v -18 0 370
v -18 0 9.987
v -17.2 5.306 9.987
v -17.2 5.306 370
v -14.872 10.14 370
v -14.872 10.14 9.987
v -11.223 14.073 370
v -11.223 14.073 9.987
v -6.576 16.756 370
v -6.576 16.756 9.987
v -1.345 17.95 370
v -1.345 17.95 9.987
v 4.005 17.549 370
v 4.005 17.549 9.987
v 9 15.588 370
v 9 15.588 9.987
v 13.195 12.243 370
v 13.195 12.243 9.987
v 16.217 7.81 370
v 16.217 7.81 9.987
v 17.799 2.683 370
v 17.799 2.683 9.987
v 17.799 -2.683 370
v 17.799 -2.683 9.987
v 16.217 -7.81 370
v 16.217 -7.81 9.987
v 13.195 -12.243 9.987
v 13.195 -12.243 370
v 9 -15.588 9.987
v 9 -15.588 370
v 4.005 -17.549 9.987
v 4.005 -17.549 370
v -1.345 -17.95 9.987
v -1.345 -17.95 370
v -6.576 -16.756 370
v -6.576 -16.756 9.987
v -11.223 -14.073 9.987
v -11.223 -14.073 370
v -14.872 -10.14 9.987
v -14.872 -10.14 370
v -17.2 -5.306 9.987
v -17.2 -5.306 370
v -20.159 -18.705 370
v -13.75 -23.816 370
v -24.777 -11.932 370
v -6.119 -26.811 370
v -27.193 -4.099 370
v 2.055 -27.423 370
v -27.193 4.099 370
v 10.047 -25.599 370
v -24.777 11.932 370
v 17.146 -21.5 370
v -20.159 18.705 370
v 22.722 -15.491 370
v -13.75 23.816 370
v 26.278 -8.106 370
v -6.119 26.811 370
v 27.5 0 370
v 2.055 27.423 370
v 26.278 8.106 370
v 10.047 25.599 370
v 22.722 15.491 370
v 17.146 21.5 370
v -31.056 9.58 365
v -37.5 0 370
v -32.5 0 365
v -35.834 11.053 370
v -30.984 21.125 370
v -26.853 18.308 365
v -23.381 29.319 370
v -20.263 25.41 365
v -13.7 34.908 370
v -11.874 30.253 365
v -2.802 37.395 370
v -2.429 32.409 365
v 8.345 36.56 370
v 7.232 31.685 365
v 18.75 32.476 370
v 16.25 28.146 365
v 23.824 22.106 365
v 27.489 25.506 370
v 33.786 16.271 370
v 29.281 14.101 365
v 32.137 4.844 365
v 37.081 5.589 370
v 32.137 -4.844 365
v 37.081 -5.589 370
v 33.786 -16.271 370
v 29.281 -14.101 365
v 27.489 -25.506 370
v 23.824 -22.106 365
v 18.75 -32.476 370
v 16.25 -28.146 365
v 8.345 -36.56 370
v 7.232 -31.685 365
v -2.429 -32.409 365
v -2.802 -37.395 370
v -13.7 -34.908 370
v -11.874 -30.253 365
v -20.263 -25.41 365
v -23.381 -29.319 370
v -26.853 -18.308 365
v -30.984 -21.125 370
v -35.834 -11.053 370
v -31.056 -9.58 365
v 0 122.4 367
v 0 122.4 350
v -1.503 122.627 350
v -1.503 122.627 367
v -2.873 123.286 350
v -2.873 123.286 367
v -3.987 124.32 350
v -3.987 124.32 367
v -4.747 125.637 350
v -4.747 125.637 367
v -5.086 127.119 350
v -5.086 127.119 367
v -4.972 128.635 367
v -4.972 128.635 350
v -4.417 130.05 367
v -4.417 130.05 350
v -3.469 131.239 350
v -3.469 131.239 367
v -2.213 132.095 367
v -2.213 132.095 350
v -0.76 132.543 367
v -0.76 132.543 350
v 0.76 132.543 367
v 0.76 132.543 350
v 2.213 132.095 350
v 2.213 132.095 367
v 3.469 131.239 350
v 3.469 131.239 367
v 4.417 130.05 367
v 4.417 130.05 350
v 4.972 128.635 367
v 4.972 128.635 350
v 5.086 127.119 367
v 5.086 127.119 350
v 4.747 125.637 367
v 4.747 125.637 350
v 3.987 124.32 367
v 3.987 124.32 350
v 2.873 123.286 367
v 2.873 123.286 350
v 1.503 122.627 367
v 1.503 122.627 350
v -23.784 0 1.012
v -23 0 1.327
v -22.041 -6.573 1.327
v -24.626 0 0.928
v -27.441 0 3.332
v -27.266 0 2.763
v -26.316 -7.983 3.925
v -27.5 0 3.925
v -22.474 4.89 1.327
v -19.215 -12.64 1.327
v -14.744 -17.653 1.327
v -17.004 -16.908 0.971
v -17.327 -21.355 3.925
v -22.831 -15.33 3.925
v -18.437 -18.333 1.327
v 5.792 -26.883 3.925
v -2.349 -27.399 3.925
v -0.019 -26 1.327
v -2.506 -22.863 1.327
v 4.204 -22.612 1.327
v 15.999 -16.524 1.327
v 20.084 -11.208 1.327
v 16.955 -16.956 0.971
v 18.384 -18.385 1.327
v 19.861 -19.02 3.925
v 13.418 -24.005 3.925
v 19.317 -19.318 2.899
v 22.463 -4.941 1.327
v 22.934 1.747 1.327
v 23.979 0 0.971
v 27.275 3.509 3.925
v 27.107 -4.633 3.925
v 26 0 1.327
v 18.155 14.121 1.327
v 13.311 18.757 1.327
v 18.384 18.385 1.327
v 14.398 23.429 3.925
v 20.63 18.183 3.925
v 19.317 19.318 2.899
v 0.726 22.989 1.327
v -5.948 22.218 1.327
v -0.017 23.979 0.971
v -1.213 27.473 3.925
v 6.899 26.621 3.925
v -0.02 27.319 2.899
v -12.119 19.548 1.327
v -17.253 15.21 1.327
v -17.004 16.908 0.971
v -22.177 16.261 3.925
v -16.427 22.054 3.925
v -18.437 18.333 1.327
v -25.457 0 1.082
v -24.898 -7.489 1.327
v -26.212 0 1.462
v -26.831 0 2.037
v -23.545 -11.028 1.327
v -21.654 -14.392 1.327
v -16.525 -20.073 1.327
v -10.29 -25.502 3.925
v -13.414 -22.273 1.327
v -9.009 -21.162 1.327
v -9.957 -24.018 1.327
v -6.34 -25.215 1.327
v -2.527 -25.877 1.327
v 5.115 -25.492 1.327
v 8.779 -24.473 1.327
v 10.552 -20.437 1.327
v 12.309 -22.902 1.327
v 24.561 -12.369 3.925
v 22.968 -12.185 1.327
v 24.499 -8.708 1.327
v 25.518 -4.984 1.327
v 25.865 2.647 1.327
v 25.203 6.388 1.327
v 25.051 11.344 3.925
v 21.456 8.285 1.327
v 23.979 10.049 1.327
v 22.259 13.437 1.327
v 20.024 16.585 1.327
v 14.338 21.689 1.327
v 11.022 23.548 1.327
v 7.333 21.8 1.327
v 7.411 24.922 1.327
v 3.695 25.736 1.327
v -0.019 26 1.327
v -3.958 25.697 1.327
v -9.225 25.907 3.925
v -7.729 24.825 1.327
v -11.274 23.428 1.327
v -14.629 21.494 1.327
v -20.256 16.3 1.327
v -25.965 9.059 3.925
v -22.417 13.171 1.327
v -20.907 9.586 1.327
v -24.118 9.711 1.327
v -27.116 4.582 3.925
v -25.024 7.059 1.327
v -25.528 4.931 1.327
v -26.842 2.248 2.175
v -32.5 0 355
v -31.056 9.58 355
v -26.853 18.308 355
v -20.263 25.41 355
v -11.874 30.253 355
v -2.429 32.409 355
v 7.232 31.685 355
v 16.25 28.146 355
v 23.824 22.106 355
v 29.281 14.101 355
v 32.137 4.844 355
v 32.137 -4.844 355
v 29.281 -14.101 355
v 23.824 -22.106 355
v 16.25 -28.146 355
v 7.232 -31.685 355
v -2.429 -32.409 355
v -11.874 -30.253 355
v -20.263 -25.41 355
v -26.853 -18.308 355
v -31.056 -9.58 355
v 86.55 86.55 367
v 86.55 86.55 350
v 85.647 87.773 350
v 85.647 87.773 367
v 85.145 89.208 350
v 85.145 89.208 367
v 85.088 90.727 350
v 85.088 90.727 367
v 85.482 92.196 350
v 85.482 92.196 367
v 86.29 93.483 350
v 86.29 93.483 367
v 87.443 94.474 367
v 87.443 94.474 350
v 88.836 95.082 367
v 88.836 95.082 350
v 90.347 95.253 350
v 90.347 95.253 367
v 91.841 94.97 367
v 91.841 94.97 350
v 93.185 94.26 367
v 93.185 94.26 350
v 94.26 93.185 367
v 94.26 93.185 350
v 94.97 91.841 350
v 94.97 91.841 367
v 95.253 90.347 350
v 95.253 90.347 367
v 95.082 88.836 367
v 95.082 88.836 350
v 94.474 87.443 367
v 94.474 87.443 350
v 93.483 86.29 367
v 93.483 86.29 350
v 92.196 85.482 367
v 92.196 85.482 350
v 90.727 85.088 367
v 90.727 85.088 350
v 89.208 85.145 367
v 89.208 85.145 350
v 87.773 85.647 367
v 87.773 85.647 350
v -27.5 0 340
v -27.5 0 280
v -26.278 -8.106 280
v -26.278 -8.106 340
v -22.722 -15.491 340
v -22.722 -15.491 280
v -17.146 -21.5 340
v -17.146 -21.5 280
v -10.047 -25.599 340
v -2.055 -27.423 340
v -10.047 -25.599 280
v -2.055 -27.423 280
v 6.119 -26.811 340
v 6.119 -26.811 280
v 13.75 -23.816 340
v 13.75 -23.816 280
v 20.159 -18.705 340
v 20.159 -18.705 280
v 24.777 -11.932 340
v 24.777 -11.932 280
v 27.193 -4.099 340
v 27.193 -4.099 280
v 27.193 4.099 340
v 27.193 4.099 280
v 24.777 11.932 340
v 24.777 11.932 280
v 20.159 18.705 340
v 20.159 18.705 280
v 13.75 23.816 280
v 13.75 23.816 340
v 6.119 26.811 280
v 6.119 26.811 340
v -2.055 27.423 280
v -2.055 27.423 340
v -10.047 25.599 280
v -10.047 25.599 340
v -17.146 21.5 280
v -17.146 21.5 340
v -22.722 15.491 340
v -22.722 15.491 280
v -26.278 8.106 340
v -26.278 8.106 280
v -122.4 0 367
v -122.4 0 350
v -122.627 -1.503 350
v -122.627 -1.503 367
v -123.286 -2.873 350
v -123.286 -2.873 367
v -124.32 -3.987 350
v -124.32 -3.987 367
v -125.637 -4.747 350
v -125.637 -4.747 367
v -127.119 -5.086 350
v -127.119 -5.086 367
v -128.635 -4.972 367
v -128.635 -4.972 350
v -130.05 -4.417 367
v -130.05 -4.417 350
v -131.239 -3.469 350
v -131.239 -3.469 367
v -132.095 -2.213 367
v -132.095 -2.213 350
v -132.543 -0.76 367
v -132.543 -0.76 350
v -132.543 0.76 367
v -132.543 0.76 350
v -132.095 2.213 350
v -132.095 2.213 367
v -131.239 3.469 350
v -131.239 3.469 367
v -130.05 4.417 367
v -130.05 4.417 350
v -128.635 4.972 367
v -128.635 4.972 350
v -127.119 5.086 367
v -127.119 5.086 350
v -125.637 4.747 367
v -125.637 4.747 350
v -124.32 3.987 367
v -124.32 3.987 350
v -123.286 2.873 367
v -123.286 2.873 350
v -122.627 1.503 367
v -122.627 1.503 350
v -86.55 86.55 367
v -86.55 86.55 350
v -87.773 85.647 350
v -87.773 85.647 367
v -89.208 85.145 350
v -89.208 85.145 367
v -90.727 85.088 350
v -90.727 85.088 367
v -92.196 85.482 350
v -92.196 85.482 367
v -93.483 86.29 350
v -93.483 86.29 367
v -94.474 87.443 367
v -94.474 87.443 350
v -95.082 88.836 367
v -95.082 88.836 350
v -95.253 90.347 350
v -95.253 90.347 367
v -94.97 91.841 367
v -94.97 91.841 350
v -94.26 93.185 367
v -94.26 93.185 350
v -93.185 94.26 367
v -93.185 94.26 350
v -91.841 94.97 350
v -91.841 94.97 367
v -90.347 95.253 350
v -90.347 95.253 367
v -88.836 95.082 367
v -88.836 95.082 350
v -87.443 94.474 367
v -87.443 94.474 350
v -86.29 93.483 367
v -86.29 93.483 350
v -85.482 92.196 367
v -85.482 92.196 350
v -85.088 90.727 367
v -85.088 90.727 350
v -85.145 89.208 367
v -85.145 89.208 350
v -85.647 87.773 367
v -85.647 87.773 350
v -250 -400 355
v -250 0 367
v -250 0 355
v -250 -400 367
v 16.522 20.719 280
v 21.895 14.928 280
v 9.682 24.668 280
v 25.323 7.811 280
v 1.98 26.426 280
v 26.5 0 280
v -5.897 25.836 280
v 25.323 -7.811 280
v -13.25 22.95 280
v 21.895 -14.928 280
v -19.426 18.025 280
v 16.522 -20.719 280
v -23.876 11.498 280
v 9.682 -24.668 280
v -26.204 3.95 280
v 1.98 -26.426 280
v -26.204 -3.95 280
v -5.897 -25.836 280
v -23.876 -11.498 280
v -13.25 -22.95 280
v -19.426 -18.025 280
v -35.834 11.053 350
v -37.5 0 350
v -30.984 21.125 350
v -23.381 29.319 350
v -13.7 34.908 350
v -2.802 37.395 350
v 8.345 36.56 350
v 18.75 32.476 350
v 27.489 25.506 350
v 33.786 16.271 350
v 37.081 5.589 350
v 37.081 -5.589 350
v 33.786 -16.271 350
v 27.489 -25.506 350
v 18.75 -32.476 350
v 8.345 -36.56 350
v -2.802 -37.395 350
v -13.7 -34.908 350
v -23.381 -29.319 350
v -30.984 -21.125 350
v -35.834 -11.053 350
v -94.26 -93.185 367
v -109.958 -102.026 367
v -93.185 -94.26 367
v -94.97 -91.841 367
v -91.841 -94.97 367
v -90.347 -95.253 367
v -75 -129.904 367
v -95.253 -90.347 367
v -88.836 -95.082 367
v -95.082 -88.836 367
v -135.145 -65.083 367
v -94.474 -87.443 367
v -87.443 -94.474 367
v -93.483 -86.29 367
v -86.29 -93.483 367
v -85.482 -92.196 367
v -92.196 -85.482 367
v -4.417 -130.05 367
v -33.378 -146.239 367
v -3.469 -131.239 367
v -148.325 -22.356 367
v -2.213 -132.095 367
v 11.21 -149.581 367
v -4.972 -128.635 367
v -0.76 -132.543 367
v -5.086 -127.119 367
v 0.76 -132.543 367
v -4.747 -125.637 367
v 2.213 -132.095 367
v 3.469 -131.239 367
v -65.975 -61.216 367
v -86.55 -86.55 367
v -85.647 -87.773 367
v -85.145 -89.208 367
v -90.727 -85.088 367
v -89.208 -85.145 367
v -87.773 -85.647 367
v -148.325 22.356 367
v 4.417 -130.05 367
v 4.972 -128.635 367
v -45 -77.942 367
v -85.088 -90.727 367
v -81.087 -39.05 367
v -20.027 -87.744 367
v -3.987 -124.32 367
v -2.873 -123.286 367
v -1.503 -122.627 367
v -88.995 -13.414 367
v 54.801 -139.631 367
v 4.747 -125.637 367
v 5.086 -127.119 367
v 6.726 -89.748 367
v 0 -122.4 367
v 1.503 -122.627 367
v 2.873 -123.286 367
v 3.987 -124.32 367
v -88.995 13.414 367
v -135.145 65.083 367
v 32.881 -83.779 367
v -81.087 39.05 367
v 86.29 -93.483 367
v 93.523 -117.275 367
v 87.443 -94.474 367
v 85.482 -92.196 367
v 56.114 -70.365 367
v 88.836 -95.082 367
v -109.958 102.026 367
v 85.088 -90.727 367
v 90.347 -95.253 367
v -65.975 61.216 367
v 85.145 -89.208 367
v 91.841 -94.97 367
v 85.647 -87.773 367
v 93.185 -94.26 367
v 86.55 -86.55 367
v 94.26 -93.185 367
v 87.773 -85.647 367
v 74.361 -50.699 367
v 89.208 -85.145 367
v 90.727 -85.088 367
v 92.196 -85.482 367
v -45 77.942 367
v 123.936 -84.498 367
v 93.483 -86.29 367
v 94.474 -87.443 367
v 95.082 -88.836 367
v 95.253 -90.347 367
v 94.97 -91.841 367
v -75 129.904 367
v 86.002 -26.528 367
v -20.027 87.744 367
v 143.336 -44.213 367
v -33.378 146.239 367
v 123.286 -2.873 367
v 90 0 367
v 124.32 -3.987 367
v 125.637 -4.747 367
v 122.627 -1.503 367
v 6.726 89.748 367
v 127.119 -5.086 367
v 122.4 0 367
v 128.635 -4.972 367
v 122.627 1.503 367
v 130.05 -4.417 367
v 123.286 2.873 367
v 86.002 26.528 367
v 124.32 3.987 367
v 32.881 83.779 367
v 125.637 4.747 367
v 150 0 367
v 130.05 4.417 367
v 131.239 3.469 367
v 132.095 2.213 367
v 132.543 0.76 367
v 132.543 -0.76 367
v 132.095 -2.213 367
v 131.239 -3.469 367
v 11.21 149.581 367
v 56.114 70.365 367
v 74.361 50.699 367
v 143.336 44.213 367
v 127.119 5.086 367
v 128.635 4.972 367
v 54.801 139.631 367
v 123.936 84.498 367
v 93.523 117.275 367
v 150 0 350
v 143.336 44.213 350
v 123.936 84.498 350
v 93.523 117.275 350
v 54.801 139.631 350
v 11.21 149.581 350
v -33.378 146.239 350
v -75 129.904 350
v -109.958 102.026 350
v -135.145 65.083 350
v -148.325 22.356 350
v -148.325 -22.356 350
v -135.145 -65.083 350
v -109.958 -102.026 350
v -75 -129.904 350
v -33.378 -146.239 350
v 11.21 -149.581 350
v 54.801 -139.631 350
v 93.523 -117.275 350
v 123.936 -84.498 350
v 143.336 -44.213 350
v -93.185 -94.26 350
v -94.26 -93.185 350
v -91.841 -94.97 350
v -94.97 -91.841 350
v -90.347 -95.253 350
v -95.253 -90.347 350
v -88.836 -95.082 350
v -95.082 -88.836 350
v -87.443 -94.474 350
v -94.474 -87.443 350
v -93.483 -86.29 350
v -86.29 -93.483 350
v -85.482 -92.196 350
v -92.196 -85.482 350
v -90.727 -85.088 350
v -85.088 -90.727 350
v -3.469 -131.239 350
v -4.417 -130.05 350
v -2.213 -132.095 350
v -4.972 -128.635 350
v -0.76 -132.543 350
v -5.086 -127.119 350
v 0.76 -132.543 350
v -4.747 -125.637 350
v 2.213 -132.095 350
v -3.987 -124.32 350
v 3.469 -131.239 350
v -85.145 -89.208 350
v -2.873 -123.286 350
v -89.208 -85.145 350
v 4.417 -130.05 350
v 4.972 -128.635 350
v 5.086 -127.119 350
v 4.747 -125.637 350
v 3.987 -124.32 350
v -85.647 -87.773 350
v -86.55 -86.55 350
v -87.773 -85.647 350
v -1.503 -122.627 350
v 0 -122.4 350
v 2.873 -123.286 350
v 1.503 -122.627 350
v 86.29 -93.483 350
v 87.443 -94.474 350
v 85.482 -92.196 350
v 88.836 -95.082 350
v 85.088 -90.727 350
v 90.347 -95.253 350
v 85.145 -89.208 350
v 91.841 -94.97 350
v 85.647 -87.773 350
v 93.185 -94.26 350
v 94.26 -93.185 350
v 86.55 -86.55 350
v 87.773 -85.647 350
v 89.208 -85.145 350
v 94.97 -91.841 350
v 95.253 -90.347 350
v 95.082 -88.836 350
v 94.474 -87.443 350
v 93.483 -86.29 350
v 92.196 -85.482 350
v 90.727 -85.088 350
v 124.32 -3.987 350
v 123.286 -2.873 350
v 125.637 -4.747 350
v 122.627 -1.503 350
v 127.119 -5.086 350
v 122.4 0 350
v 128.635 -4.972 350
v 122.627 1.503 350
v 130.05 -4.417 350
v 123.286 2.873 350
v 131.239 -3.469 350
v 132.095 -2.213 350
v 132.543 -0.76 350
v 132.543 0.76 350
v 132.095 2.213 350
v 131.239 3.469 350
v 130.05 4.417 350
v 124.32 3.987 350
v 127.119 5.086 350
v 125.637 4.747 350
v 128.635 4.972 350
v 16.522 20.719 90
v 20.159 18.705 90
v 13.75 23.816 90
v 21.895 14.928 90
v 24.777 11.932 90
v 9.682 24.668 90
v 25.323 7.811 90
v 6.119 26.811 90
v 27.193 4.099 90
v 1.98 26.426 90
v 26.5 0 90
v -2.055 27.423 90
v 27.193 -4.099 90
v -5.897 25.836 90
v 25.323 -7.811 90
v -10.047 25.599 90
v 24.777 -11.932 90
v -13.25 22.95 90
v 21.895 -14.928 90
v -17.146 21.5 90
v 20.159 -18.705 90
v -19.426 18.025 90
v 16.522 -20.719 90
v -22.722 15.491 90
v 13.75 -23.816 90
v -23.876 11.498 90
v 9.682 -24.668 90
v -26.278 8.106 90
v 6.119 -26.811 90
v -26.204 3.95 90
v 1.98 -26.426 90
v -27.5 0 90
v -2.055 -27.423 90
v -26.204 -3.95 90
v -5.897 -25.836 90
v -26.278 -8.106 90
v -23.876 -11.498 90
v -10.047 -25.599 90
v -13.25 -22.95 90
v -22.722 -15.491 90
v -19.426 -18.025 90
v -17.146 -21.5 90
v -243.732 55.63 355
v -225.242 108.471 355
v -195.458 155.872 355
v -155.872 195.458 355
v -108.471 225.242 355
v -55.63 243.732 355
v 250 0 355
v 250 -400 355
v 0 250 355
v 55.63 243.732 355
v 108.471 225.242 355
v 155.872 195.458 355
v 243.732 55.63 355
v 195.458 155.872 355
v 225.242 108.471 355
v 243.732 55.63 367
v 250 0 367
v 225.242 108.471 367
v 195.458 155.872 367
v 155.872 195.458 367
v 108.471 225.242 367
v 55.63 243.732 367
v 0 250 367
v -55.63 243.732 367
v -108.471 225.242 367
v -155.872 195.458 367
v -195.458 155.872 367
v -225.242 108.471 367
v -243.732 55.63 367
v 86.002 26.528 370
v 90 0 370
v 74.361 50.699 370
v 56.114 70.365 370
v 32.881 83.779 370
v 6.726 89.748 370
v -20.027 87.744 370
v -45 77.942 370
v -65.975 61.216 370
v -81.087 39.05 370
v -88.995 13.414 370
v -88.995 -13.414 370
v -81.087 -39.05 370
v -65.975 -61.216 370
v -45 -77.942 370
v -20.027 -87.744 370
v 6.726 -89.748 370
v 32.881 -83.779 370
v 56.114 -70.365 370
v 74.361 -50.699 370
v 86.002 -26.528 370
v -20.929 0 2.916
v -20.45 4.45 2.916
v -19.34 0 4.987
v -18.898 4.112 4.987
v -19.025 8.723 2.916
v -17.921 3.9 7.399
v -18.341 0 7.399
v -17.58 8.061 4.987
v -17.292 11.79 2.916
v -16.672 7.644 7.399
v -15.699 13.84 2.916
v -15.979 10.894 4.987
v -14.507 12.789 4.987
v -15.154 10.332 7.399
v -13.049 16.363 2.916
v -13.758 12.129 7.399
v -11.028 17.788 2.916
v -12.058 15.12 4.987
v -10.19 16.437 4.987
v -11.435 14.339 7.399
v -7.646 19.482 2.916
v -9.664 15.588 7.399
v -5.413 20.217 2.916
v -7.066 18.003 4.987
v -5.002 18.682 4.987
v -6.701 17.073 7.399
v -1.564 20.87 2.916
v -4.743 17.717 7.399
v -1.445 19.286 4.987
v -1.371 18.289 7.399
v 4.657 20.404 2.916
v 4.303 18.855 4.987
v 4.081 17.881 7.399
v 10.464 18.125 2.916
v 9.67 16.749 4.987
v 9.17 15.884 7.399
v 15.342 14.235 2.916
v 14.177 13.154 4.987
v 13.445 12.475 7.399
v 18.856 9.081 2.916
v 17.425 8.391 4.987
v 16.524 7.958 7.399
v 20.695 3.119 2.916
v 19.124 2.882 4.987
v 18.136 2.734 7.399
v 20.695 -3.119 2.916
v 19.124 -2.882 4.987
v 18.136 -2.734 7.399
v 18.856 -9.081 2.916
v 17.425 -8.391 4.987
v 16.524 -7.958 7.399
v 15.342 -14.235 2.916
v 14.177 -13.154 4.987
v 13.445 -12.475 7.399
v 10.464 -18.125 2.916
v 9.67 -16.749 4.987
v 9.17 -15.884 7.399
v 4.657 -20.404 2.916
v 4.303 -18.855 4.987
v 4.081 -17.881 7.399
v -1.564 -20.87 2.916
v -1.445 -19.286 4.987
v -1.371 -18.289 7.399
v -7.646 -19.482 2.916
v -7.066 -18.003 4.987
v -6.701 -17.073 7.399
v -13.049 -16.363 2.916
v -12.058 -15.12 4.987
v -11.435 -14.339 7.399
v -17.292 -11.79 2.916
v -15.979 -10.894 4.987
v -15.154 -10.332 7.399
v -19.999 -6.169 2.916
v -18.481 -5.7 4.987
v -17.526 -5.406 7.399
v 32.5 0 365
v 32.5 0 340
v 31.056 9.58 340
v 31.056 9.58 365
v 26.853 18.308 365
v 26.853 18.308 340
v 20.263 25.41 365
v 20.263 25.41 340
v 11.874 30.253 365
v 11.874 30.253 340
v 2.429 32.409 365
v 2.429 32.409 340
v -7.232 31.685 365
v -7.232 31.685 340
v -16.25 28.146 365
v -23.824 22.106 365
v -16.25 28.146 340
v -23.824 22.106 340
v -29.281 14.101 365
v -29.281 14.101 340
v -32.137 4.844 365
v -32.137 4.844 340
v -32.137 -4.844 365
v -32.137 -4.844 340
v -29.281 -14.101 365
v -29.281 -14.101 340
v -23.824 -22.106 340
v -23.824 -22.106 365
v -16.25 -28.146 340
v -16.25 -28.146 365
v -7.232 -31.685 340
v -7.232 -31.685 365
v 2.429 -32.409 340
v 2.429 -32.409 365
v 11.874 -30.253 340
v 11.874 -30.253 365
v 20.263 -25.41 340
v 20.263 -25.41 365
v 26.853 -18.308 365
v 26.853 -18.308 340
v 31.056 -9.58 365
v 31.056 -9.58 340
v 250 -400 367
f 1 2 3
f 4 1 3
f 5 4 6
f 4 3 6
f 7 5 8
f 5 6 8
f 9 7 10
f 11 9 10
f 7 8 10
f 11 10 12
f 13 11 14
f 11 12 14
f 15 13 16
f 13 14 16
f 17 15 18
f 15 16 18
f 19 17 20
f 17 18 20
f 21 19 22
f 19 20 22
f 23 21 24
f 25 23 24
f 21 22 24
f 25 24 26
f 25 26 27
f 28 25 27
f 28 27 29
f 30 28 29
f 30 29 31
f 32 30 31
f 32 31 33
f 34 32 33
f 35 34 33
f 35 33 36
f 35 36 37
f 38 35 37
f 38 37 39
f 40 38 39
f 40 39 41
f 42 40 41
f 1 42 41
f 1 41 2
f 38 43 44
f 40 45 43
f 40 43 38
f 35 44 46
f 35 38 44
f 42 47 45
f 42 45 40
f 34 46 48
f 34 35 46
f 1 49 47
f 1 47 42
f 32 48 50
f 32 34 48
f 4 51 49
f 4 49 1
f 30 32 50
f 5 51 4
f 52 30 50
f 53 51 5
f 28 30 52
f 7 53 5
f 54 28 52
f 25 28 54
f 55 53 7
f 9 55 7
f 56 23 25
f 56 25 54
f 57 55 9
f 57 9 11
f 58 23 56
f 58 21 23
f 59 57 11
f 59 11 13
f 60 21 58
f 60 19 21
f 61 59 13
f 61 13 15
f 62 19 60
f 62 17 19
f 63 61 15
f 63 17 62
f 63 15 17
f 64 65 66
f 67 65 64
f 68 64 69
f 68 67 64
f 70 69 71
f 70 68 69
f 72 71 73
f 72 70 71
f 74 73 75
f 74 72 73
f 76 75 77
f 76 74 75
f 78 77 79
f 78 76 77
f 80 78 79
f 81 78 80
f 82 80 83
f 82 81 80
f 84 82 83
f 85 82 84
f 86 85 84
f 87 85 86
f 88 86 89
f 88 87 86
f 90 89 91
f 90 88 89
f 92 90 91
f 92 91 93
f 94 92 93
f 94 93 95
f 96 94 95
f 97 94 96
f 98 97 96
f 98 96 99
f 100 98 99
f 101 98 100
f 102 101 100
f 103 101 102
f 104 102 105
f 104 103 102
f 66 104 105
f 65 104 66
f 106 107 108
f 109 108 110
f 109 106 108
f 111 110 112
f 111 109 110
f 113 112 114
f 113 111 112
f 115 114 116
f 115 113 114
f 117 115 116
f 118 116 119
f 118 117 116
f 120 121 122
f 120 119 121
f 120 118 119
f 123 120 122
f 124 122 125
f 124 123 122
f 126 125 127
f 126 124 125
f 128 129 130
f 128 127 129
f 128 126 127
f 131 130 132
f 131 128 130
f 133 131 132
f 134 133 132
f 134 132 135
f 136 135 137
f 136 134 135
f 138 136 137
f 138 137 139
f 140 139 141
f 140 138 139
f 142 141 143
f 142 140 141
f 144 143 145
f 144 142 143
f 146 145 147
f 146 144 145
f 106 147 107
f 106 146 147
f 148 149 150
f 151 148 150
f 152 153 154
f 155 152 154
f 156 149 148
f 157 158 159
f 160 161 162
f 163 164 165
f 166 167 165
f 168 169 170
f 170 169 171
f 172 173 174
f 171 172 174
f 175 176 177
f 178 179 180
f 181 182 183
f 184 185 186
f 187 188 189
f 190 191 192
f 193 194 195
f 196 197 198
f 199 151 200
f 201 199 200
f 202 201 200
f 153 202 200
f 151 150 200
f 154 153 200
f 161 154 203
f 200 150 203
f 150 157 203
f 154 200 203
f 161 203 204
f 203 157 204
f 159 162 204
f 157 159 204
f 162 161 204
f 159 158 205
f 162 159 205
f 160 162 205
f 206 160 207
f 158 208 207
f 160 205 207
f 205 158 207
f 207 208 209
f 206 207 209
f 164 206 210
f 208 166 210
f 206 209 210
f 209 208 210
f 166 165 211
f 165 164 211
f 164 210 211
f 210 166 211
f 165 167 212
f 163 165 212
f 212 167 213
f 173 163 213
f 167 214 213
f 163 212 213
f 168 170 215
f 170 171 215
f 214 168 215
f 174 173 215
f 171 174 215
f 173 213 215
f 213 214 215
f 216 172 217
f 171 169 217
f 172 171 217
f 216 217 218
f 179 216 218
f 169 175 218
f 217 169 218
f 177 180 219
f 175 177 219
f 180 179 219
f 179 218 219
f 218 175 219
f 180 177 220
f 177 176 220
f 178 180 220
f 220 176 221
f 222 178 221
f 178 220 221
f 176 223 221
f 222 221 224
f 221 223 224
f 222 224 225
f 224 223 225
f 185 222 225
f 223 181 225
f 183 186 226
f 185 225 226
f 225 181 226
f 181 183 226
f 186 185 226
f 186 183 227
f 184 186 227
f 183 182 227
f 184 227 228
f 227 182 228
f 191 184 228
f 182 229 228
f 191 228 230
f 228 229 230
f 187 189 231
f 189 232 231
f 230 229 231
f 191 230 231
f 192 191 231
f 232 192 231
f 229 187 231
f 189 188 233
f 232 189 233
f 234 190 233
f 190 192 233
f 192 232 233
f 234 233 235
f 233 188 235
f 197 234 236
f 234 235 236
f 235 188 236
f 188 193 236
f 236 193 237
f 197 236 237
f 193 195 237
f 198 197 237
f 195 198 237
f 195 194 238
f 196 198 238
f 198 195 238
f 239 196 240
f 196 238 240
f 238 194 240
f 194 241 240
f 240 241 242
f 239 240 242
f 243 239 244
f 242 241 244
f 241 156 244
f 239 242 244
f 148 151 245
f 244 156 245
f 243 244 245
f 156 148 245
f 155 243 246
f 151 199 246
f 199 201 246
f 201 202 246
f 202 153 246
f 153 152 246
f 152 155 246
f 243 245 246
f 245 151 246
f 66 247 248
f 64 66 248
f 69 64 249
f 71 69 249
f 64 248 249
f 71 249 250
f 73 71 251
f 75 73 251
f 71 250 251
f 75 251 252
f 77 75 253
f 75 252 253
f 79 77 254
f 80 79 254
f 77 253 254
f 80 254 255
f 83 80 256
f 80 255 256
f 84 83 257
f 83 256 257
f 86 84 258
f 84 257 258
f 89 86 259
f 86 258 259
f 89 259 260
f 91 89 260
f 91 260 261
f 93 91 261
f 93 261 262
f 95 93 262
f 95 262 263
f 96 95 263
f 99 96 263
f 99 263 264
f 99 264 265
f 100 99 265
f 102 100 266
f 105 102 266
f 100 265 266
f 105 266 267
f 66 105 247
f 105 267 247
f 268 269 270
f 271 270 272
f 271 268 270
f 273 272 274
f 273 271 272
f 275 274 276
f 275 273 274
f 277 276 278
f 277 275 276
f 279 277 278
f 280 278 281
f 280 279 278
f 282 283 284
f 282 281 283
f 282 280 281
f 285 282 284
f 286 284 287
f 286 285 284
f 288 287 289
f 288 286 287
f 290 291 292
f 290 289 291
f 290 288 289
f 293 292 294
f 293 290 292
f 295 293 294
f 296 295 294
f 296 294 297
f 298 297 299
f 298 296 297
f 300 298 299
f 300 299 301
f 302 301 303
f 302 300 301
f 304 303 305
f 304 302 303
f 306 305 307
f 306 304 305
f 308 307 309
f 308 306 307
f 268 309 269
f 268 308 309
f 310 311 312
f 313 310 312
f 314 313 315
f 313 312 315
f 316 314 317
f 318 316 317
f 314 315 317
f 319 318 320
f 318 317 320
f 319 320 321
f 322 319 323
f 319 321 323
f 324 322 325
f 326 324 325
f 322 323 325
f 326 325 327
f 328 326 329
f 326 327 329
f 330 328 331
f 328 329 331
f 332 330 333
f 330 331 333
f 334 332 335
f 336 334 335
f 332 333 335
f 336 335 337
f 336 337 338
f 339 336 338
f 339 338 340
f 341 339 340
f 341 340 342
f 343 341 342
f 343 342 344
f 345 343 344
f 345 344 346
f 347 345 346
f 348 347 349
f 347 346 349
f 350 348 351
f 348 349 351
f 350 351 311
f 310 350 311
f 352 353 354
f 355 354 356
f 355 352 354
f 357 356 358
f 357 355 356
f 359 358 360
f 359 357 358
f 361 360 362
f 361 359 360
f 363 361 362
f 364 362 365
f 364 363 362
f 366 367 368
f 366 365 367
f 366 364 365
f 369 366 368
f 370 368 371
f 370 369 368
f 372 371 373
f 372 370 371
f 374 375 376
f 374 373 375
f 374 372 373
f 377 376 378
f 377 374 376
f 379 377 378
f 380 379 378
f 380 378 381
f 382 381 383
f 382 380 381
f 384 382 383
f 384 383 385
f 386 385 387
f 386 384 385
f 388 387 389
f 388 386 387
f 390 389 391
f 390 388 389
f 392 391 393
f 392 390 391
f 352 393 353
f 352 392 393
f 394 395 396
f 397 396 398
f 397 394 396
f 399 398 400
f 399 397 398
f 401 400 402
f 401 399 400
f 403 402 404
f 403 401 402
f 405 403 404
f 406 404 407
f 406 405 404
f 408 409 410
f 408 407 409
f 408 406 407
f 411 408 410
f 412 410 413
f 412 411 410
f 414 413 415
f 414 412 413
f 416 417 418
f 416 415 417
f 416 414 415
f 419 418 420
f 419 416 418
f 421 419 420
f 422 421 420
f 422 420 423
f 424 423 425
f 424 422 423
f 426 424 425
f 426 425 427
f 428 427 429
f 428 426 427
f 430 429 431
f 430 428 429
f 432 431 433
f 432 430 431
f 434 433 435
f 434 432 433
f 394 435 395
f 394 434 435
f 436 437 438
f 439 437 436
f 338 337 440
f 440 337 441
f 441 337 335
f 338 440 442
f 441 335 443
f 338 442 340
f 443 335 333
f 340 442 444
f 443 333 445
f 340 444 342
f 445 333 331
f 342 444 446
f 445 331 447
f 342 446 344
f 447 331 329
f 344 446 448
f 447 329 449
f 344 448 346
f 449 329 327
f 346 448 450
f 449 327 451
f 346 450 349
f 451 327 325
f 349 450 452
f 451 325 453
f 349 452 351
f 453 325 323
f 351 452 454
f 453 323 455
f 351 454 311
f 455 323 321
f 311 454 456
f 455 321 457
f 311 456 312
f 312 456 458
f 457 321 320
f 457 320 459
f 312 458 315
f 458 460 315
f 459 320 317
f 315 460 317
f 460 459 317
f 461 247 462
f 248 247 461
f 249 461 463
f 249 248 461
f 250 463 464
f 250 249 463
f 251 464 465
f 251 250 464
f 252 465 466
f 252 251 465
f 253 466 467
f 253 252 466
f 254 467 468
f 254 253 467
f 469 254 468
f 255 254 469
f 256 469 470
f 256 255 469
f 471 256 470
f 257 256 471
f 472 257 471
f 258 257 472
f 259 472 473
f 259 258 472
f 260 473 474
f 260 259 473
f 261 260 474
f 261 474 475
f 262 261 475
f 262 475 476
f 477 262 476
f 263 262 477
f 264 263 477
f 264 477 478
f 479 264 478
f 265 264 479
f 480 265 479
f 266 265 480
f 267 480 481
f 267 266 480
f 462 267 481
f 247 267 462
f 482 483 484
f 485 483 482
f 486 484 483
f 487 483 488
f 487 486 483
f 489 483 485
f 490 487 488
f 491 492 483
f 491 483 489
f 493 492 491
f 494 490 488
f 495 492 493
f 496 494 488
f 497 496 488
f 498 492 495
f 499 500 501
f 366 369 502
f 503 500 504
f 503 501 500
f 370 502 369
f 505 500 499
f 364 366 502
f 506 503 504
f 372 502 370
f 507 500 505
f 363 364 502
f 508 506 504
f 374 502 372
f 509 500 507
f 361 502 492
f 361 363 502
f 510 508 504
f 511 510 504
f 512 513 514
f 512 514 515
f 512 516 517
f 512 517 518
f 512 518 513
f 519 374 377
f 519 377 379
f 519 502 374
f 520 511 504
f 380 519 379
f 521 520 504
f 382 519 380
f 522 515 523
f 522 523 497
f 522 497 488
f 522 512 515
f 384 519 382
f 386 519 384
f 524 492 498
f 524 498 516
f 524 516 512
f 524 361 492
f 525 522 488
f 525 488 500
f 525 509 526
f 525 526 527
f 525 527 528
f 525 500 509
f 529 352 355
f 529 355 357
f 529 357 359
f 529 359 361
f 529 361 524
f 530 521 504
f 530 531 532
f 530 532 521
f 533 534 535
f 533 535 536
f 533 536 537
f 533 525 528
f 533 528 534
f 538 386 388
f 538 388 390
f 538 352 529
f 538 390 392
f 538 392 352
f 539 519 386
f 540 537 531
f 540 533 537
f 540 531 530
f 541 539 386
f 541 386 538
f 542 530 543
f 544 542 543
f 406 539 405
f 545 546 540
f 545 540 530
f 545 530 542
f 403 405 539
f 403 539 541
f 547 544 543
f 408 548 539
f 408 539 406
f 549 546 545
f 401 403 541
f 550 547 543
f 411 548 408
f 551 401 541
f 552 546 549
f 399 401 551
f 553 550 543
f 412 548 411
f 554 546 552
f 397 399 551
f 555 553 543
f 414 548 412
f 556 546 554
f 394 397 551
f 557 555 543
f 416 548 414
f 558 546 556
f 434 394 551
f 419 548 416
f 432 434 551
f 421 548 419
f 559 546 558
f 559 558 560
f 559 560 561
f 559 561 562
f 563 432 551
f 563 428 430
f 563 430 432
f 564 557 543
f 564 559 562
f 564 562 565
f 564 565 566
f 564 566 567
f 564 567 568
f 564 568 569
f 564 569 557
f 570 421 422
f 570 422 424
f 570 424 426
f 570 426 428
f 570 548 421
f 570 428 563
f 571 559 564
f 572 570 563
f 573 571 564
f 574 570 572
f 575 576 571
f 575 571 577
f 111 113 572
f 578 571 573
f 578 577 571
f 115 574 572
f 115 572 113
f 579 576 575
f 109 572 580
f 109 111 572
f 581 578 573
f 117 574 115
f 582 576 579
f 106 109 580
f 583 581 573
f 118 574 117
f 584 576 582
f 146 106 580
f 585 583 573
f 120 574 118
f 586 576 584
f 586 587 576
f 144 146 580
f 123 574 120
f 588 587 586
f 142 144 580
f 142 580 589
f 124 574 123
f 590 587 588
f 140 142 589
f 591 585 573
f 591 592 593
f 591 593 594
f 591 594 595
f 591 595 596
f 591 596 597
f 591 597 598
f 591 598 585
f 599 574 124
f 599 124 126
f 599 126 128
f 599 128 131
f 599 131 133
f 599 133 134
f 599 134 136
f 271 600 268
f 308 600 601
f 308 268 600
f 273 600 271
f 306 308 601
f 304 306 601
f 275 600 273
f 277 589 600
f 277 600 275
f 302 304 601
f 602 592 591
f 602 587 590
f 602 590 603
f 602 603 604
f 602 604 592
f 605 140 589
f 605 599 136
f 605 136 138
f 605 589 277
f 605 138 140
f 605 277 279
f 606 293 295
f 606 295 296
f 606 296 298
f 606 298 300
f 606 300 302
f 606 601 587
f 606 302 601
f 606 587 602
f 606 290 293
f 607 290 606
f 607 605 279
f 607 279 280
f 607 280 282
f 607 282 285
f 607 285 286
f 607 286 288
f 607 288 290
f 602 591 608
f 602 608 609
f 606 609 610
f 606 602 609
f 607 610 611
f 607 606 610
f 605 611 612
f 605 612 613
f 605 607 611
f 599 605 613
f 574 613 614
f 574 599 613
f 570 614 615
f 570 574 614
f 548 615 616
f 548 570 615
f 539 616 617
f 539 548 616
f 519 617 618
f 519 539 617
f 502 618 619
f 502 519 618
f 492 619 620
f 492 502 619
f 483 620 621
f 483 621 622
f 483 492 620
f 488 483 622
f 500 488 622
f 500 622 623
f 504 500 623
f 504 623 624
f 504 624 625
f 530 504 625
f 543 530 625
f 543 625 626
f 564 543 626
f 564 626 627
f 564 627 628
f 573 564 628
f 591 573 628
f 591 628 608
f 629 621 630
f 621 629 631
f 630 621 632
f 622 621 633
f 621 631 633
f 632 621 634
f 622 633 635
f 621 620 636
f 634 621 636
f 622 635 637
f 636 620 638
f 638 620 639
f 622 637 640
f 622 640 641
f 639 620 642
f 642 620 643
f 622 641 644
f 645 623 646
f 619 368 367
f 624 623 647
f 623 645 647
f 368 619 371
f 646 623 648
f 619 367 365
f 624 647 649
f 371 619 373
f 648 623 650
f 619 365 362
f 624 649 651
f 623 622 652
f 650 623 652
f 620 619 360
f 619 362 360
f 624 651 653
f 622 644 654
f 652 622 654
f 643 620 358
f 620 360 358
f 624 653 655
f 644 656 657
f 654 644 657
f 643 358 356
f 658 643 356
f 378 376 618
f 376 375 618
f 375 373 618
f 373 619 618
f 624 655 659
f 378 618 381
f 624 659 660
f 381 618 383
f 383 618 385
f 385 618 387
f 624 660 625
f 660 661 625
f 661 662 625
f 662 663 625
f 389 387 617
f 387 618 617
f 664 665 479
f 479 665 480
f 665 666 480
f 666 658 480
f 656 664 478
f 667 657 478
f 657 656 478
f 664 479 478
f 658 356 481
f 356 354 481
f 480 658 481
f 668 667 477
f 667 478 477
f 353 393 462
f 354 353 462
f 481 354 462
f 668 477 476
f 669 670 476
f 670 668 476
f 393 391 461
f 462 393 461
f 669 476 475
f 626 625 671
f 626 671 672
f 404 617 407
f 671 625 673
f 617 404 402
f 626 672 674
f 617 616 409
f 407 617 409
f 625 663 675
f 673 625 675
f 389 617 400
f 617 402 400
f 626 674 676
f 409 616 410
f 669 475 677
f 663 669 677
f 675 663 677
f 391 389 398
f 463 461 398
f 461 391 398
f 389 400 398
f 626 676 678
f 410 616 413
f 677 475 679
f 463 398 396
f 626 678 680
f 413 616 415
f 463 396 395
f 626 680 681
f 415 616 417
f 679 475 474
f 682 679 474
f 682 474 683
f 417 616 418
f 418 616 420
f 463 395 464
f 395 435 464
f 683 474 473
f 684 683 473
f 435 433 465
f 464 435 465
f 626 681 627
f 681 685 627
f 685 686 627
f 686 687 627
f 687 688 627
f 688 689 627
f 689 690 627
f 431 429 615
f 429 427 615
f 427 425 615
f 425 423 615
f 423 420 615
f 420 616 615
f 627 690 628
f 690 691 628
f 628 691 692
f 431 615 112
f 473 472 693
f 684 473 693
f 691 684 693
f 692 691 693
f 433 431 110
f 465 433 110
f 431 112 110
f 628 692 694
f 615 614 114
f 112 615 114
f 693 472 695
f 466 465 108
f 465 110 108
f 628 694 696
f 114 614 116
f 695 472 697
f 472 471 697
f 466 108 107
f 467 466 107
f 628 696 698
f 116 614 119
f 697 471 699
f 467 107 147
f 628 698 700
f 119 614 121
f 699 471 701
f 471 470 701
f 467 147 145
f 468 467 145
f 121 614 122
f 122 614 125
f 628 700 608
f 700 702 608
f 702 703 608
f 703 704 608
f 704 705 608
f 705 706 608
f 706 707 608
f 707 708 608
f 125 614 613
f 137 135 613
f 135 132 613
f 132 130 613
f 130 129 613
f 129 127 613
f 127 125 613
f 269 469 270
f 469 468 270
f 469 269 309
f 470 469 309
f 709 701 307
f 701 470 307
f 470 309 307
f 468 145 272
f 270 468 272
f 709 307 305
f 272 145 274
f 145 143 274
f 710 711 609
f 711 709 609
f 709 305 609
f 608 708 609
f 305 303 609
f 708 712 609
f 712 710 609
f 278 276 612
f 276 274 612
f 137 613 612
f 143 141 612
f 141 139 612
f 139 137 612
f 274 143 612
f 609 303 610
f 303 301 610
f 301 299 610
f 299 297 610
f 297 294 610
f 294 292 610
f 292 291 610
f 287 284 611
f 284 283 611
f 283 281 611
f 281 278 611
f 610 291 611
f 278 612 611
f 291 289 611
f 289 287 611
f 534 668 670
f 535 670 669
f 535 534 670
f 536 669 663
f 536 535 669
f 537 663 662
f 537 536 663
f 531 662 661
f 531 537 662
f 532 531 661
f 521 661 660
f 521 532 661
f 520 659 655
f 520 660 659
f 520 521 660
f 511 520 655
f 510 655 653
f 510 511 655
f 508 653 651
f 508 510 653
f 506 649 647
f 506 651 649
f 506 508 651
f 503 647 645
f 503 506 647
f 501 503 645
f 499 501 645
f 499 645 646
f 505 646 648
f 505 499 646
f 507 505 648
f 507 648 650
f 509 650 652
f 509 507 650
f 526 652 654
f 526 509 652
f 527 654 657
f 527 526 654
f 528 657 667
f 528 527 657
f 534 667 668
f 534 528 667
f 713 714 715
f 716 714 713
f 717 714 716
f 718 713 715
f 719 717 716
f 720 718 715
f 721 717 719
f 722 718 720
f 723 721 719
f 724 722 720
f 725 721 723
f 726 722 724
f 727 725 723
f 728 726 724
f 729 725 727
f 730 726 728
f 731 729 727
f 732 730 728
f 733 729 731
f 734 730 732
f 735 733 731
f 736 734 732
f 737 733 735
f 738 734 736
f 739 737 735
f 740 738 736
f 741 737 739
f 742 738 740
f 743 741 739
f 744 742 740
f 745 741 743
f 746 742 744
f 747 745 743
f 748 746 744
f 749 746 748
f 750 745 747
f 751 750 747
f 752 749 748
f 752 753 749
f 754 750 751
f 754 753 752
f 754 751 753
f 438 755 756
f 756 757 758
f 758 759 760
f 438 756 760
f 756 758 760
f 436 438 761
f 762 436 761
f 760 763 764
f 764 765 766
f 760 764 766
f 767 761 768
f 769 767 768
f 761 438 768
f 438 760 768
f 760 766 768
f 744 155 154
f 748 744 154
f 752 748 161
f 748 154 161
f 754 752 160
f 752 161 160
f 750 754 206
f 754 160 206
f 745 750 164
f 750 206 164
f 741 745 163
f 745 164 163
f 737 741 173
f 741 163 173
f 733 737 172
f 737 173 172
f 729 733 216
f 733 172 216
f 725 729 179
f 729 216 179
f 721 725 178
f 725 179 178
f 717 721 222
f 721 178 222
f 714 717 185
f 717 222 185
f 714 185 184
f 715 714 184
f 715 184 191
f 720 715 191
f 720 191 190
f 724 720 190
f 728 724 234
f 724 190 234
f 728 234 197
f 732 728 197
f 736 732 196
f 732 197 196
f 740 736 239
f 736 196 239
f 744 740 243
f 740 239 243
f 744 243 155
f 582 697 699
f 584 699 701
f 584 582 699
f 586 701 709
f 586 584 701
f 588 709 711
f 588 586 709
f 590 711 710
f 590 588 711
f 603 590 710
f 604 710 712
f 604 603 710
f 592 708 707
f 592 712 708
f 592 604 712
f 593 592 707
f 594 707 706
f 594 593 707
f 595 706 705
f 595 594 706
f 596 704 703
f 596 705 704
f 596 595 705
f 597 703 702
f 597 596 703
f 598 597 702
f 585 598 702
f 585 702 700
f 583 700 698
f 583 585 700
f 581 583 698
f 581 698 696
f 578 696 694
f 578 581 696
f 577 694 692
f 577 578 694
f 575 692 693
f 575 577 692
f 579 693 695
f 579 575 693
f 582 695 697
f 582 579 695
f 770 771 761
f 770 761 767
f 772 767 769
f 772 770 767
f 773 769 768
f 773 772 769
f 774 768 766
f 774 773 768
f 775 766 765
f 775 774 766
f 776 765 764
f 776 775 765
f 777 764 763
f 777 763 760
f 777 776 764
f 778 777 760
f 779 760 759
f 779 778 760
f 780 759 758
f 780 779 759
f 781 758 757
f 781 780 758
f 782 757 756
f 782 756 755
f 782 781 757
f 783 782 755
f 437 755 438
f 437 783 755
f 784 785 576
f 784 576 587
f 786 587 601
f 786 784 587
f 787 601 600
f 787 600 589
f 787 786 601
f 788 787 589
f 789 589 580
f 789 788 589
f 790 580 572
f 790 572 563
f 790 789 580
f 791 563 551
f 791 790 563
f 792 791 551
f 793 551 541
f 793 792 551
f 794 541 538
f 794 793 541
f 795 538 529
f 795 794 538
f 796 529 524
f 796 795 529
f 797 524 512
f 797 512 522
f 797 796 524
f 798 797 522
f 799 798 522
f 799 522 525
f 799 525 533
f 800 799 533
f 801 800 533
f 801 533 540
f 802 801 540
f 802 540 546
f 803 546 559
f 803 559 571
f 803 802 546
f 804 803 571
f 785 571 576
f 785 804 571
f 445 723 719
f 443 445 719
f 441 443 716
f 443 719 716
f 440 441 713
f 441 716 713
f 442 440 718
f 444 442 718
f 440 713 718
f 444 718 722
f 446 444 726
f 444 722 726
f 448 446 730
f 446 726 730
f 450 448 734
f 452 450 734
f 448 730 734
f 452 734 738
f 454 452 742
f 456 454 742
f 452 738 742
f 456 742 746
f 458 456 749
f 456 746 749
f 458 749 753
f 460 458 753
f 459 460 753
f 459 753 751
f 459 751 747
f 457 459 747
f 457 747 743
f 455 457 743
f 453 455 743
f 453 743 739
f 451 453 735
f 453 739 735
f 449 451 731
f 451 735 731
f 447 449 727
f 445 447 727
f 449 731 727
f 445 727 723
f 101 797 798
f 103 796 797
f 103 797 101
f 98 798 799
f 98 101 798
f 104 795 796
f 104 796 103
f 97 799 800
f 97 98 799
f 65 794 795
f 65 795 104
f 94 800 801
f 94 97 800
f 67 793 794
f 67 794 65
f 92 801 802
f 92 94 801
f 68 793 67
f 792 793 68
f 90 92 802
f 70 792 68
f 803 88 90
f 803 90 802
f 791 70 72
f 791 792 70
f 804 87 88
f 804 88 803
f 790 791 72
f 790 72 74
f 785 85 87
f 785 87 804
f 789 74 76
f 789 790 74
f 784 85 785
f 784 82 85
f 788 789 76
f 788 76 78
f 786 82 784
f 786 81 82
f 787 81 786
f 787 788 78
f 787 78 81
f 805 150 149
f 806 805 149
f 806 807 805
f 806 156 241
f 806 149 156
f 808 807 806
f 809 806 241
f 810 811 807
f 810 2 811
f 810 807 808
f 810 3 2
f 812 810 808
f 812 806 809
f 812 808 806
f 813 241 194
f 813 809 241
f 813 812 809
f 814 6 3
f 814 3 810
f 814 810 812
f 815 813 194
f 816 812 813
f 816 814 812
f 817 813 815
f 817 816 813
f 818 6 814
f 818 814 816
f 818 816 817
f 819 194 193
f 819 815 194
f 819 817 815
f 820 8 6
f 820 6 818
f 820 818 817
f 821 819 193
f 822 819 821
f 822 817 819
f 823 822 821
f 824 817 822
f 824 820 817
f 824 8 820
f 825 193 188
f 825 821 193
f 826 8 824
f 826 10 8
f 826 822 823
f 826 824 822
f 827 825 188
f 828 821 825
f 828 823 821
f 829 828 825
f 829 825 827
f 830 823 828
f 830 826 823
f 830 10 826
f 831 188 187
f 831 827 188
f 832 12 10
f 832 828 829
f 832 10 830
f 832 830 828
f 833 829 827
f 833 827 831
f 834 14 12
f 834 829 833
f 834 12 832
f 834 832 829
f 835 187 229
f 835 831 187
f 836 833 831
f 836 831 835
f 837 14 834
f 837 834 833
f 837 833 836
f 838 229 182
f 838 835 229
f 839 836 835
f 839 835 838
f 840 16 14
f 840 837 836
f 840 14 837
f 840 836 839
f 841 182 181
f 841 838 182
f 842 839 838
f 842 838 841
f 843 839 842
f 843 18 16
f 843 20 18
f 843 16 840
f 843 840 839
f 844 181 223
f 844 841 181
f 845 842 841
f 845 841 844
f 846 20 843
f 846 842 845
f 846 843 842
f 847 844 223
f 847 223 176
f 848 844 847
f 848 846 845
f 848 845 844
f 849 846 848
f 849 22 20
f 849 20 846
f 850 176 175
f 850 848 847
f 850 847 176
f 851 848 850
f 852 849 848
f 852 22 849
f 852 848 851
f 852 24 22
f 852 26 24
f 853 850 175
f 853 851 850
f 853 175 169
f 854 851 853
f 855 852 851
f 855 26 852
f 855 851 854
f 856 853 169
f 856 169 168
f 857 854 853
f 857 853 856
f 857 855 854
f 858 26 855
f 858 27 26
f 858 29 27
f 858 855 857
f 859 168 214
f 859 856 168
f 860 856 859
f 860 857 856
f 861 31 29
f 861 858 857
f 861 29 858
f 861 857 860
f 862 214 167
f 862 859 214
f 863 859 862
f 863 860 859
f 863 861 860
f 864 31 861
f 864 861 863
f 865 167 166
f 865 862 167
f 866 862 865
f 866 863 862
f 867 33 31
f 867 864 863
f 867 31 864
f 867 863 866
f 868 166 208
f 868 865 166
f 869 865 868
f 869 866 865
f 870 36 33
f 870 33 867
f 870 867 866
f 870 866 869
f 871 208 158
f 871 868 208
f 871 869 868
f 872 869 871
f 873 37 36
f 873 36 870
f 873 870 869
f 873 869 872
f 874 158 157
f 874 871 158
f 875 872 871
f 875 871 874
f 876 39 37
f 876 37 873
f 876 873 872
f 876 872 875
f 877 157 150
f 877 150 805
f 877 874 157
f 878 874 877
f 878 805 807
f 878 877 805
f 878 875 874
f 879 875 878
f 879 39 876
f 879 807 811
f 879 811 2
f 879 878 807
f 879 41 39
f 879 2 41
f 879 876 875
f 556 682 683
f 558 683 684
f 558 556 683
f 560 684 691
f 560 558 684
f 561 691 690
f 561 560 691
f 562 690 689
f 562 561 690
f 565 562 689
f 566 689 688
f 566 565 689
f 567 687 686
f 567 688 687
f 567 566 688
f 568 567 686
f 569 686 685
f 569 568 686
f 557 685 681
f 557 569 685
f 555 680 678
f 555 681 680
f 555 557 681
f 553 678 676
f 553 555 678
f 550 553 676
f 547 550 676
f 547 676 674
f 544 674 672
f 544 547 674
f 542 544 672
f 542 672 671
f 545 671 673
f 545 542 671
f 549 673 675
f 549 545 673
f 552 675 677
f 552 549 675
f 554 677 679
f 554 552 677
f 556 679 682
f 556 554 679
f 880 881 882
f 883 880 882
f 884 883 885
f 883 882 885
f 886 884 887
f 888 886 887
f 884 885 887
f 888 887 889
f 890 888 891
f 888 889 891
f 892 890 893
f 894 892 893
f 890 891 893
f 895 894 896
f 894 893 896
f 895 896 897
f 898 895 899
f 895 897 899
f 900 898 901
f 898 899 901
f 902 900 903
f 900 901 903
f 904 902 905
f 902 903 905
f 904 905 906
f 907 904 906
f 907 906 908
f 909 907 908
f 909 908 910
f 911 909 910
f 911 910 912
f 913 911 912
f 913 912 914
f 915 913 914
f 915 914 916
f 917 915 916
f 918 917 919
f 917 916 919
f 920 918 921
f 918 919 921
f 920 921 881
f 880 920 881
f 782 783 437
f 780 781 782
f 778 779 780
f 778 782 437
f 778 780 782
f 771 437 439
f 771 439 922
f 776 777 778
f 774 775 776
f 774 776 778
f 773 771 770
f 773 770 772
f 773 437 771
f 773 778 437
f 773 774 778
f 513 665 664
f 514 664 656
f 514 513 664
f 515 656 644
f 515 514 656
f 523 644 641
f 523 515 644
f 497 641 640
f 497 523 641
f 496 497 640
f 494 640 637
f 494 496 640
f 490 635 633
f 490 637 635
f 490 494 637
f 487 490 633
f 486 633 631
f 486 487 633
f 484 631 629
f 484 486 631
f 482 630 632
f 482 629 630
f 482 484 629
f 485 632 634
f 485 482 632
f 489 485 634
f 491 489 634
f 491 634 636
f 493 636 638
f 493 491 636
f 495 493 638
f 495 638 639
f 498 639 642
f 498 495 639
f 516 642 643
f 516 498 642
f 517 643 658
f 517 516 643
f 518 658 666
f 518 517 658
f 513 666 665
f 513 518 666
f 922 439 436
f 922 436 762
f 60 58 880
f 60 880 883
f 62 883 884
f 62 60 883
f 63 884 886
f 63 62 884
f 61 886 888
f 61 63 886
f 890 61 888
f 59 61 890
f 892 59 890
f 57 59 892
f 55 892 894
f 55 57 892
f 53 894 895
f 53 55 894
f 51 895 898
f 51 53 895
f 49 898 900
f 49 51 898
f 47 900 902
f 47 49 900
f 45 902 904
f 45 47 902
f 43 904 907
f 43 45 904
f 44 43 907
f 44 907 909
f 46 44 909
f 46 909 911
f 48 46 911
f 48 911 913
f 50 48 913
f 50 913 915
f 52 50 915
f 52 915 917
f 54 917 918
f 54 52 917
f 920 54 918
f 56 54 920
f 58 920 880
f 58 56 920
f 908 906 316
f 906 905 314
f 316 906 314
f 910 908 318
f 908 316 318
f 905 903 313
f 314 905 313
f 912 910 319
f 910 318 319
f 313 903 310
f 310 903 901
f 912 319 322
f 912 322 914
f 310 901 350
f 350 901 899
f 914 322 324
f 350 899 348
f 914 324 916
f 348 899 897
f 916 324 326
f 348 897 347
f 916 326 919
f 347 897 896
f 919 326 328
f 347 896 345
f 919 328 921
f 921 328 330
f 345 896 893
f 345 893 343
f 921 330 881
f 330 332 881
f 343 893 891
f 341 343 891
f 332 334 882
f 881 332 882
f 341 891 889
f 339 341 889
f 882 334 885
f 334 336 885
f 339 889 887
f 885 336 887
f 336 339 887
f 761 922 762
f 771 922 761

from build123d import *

# Parameters (mm, degrees)
SKETCH_1_R               = 27.5
EXTRUDE_1_DEPTH          = 90
SKETCH_2_R               = 26.5
EXTRUDE_2_DEPTH          = 190
SKETCH_3_R               = 27.5
EXTRUDE_3_DEPTH          = 60
SKETCH_4_R               = 32.5
EXTRUDE_4_DEPTH          = 30
SKETCH_5_R               = 150.00000000000003
EXTRUDE_5_DEPTH          = 20
SKETCH_6_R               = 32.5
CUT_EXTRUDE_1_DEPTH      = 20
CHAMFER_4_SIZE           = 5
SKETCH_8_OUTSIDE_W       = 414.588
SKETCH_8_OUTSIDE_H       = 414.588
SKETCH_8_OUTSIDE_R       = 90
CUT_EXTRUDE_2_DEPTH      = 3
CHAMFER_5_SIZE           = 5
CHAMFER_6_SIZE           = 5
SKETCH_12_R              = 3.000000000000001
CUT_EXTRUDE_4_DEPTH      = 410.2676385936225
PATTERN_CIRCULAR_1_COUNT = 8
SKETCH_13_R              = 18
CUT_EXTRUDE_5_DEPTH      = 427.49736224272243
FILLET_1_R               = 10
FILLET_2_R               = 3
PATTERN_CIRCULAR_2_COUNT = 8
EXTRUDE_6_DEPTH          = 12


with BuildPart() as part:
    # 草图1 → 凸台-拉伸1 (new body)
    with BuildSketch(Plane.XY):
        with Locations(Location((0, 0, 0), (0, 0, 180))):
            Circle(SKETCH_1_R)
    extrude(amount=EXTRUDE_1_DEPTH)

    # 草图2 → 凸台-拉伸2 (add)
    with BuildSketch(Plane.XY.offset(90)):
        Circle(SKETCH_2_R)
    extrude(amount=EXTRUDE_2_DEPTH)

    # 草图3 → 凸台-拉伸3 (add)
    with BuildSketch(Plane.XY.offset(280)):
        with Locations(Location((0, 0, 0), (0, 0, 180))):
            Circle(SKETCH_3_R)
    extrude(amount=EXTRUDE_3_DEPTH)

    # 草图4 → 凸台-拉伸4 (add)
    with BuildSketch(Plane.XY.offset(340)):
        Circle(SKETCH_4_R)
    extrude(amount=EXTRUDE_4_DEPTH)

    # 倒角5
    chamfer_5_edges = [part.edges().sort_by_distance(p)[0] for p in [
        (-32.5, 3.98e-15, 370),
    ]]
    chamfer(chamfer_5_edges, length=CHAMFER_5_SIZE)

    # 草图9 → M12 螺纹孔1 (revolve, cut)
    with BuildSketch(Plane.YZ):
        Polygon((0, 0), (-7.91e-15, 32.31438915704056), (5.099999999999992, 29.25), (5.099999999999995, -2.3e-16), align=None)
    revolve(axis=Axis((0, 0, -6.349999999999991), (0, 0, 1)), mode=Mode.SUBTRACT)

    # 草图13 → 切除-拉伸5 (cut, through all)
    with BuildSketch(Plane(origin=(0, 0, 0), x_dir=(-1, 0, 0), z_dir=(0, 0, -1))):
        Circle(SKETCH_13_R)
    extrude(amount=-CUT_EXTRUDE_5_DEPTH, mode=Mode.SUBTRACT)

    # 圆角1
    # the kernel refuses this fillet: 10 mm, written as the material it takes off along each edge
    with BuildSketch(Plane(origin=(0, 0, 0), x_dir=(-1, 0, 0), z_dir=(0, -1, 0))) as fillet_1_piece_1:
        with BuildLine():
            CenterArc((28, -9.987492177719089), FILLET_1_R, 92.86598398259886, 87.13401601740111)
            Line((27.5, 0), (27.49, 0.19974984355438177))
            ThreePointArc((27.49, 0.19974984355438177), (22.75, 0.2), (18, 0.2))
            Line((18, 0.2), (17.8, 0))
            Line((17.8, 0), (17.8, -9.987492177719089))
            Line((17.8, -9.987492177719089), (18, -9.987492177719089))
        make_face()
    revolve(axis=Axis((0, 0, 0), (0, 0, -1)), mode=Mode.SUBTRACT)

    # 圆角2
    fillet_2_edges = [part.edges().sort_by_distance(p)[0] for p in [
        (27.5, -6.74e-15, 0),
    ]]
    fillet(fillet_2_edges, radius=FILLET_2_R)


with BuildPart() as body_2:
    # 草图5 → 凸台-拉伸5 (new body)
    with BuildSketch(Plane.XY.offset(370)):
        Circle(SKETCH_5_R)
    extrude(amount=-EXTRUDE_5_DEPTH)

    # 草图6 → 切除-拉伸1 (cut)
    with BuildSketch(Plane(origin=(0, 0, 350), x_dir=(-1, 0, 0), z_dir=(0, 0, -1))):
        Circle(SKETCH_6_R)
    extrude(amount=-CUT_EXTRUDE_1_DEPTH, mode=Mode.SUBTRACT)

    # 倒角4
    chamfer_4_edges = [body_2.edges().sort_by_distance(p)[0] for p in [
        (32.5, 3.98e-15, 350),
    ]]
    chamfer(chamfer_4_edges, length=CHAMFER_4_SIZE)

    # 草图8 outside → 切除-拉伸2 (cut)
    with BuildSketch(Plane.XY.offset(370)):
        Rectangle(SKETCH_8_OUTSIDE_W, SKETCH_8_OUTSIDE_H)
        Circle(SKETCH_8_OUTSIDE_R, mode=Mode.SUBTRACT)
    extrude(amount=-CUT_EXTRUDE_2_DEPTH, mode=Mode.SUBTRACT)

    # 倒角6
    chamfer_6_edges = [body_2.edges().sort_by_distance(p)[0] for p in [
        (32.5, 3.98e-15, 370),
    ]]
    chamfer(chamfer_6_edges, length=CHAMFER_6_SIZE)

    # 草图12 → 切除-拉伸4 (cut, through all)
    with BuildSketch(Plane(origin=(0, 0, 350), x_dir=(-1, 0, 0), z_dir=(0, 0, -1))):
        with Locations((7.91e-15, 127.5)):
            Circle(SKETCH_12_R)
    cut_extrude_4 = extrude(amount=-CUT_EXTRUDE_4_DEPTH, mode=Mode.SUBTRACT)

    # 阵列(圆周)1: 切除-拉伸4 ×8 about axis
    pattern_circular_1_axis = Axis((1.1129e-13, 0, 0), (0, 0, 1))
    for i in range(1, PATTERN_CIRCULAR_1_COUNT):
        add(cut_extrude_4.rotate(pattern_circular_1_axis, i * 360 / PATTERN_CIRCULAR_1_COUNT), mode=Mode.SUBTRACT)

    # 草图15 → M12 螺纹孔2 (revolve, cut)
    with BuildSketch(Plane(origin=(-7.91e-15, 127.5, 367), x_dir=(0, -1, 0), z_dir=(1, 0, 0))):
        Polygon((0, 0), (-7.91e-15, 32.314389157040544), (5.0999999999999845, 29.25), (5.099999999999987, -9.3e-16), align=None)
    hole_wizard_m12_2 = revolve(axis=Axis((-7.91e-15, 127.5, 373.34999999999997), (0, 0, -1)), mode=Mode.SUBTRACT)

    # 阵列(圆周)2: M12 螺纹孔2 ×8 about axis
    pattern_circular_2_axis = Axis((-1.1129e-13, 0, 0), (0, 0, 1))
    for i in range(1, PATTERN_CIRCULAR_2_COUNT):
        add(hole_wizard_m12_2.rotate(pattern_circular_2_axis, i * 360 / PATTERN_CIRCULAR_2_COUNT), mode=Mode.SUBTRACT)


with BuildPart() as body_3:
    # 草图17 → 凸台-拉伸6 (new body)
    with BuildSketch(Plane.XY.offset(367)):
        with BuildLine():
            Line((-250, 0), (-250, -400))
            Line((-250, -400), (250, -400))
            Line((250, -400), (250, 0))
            ThreePointArc((250, 0), (1.531e-14, 250), (-250, 0))
        make_face()
    extrude(amount=-EXTRUDE_6_DEPTH)


solid = Compound([part.part, body_2.part, body_3.part])
